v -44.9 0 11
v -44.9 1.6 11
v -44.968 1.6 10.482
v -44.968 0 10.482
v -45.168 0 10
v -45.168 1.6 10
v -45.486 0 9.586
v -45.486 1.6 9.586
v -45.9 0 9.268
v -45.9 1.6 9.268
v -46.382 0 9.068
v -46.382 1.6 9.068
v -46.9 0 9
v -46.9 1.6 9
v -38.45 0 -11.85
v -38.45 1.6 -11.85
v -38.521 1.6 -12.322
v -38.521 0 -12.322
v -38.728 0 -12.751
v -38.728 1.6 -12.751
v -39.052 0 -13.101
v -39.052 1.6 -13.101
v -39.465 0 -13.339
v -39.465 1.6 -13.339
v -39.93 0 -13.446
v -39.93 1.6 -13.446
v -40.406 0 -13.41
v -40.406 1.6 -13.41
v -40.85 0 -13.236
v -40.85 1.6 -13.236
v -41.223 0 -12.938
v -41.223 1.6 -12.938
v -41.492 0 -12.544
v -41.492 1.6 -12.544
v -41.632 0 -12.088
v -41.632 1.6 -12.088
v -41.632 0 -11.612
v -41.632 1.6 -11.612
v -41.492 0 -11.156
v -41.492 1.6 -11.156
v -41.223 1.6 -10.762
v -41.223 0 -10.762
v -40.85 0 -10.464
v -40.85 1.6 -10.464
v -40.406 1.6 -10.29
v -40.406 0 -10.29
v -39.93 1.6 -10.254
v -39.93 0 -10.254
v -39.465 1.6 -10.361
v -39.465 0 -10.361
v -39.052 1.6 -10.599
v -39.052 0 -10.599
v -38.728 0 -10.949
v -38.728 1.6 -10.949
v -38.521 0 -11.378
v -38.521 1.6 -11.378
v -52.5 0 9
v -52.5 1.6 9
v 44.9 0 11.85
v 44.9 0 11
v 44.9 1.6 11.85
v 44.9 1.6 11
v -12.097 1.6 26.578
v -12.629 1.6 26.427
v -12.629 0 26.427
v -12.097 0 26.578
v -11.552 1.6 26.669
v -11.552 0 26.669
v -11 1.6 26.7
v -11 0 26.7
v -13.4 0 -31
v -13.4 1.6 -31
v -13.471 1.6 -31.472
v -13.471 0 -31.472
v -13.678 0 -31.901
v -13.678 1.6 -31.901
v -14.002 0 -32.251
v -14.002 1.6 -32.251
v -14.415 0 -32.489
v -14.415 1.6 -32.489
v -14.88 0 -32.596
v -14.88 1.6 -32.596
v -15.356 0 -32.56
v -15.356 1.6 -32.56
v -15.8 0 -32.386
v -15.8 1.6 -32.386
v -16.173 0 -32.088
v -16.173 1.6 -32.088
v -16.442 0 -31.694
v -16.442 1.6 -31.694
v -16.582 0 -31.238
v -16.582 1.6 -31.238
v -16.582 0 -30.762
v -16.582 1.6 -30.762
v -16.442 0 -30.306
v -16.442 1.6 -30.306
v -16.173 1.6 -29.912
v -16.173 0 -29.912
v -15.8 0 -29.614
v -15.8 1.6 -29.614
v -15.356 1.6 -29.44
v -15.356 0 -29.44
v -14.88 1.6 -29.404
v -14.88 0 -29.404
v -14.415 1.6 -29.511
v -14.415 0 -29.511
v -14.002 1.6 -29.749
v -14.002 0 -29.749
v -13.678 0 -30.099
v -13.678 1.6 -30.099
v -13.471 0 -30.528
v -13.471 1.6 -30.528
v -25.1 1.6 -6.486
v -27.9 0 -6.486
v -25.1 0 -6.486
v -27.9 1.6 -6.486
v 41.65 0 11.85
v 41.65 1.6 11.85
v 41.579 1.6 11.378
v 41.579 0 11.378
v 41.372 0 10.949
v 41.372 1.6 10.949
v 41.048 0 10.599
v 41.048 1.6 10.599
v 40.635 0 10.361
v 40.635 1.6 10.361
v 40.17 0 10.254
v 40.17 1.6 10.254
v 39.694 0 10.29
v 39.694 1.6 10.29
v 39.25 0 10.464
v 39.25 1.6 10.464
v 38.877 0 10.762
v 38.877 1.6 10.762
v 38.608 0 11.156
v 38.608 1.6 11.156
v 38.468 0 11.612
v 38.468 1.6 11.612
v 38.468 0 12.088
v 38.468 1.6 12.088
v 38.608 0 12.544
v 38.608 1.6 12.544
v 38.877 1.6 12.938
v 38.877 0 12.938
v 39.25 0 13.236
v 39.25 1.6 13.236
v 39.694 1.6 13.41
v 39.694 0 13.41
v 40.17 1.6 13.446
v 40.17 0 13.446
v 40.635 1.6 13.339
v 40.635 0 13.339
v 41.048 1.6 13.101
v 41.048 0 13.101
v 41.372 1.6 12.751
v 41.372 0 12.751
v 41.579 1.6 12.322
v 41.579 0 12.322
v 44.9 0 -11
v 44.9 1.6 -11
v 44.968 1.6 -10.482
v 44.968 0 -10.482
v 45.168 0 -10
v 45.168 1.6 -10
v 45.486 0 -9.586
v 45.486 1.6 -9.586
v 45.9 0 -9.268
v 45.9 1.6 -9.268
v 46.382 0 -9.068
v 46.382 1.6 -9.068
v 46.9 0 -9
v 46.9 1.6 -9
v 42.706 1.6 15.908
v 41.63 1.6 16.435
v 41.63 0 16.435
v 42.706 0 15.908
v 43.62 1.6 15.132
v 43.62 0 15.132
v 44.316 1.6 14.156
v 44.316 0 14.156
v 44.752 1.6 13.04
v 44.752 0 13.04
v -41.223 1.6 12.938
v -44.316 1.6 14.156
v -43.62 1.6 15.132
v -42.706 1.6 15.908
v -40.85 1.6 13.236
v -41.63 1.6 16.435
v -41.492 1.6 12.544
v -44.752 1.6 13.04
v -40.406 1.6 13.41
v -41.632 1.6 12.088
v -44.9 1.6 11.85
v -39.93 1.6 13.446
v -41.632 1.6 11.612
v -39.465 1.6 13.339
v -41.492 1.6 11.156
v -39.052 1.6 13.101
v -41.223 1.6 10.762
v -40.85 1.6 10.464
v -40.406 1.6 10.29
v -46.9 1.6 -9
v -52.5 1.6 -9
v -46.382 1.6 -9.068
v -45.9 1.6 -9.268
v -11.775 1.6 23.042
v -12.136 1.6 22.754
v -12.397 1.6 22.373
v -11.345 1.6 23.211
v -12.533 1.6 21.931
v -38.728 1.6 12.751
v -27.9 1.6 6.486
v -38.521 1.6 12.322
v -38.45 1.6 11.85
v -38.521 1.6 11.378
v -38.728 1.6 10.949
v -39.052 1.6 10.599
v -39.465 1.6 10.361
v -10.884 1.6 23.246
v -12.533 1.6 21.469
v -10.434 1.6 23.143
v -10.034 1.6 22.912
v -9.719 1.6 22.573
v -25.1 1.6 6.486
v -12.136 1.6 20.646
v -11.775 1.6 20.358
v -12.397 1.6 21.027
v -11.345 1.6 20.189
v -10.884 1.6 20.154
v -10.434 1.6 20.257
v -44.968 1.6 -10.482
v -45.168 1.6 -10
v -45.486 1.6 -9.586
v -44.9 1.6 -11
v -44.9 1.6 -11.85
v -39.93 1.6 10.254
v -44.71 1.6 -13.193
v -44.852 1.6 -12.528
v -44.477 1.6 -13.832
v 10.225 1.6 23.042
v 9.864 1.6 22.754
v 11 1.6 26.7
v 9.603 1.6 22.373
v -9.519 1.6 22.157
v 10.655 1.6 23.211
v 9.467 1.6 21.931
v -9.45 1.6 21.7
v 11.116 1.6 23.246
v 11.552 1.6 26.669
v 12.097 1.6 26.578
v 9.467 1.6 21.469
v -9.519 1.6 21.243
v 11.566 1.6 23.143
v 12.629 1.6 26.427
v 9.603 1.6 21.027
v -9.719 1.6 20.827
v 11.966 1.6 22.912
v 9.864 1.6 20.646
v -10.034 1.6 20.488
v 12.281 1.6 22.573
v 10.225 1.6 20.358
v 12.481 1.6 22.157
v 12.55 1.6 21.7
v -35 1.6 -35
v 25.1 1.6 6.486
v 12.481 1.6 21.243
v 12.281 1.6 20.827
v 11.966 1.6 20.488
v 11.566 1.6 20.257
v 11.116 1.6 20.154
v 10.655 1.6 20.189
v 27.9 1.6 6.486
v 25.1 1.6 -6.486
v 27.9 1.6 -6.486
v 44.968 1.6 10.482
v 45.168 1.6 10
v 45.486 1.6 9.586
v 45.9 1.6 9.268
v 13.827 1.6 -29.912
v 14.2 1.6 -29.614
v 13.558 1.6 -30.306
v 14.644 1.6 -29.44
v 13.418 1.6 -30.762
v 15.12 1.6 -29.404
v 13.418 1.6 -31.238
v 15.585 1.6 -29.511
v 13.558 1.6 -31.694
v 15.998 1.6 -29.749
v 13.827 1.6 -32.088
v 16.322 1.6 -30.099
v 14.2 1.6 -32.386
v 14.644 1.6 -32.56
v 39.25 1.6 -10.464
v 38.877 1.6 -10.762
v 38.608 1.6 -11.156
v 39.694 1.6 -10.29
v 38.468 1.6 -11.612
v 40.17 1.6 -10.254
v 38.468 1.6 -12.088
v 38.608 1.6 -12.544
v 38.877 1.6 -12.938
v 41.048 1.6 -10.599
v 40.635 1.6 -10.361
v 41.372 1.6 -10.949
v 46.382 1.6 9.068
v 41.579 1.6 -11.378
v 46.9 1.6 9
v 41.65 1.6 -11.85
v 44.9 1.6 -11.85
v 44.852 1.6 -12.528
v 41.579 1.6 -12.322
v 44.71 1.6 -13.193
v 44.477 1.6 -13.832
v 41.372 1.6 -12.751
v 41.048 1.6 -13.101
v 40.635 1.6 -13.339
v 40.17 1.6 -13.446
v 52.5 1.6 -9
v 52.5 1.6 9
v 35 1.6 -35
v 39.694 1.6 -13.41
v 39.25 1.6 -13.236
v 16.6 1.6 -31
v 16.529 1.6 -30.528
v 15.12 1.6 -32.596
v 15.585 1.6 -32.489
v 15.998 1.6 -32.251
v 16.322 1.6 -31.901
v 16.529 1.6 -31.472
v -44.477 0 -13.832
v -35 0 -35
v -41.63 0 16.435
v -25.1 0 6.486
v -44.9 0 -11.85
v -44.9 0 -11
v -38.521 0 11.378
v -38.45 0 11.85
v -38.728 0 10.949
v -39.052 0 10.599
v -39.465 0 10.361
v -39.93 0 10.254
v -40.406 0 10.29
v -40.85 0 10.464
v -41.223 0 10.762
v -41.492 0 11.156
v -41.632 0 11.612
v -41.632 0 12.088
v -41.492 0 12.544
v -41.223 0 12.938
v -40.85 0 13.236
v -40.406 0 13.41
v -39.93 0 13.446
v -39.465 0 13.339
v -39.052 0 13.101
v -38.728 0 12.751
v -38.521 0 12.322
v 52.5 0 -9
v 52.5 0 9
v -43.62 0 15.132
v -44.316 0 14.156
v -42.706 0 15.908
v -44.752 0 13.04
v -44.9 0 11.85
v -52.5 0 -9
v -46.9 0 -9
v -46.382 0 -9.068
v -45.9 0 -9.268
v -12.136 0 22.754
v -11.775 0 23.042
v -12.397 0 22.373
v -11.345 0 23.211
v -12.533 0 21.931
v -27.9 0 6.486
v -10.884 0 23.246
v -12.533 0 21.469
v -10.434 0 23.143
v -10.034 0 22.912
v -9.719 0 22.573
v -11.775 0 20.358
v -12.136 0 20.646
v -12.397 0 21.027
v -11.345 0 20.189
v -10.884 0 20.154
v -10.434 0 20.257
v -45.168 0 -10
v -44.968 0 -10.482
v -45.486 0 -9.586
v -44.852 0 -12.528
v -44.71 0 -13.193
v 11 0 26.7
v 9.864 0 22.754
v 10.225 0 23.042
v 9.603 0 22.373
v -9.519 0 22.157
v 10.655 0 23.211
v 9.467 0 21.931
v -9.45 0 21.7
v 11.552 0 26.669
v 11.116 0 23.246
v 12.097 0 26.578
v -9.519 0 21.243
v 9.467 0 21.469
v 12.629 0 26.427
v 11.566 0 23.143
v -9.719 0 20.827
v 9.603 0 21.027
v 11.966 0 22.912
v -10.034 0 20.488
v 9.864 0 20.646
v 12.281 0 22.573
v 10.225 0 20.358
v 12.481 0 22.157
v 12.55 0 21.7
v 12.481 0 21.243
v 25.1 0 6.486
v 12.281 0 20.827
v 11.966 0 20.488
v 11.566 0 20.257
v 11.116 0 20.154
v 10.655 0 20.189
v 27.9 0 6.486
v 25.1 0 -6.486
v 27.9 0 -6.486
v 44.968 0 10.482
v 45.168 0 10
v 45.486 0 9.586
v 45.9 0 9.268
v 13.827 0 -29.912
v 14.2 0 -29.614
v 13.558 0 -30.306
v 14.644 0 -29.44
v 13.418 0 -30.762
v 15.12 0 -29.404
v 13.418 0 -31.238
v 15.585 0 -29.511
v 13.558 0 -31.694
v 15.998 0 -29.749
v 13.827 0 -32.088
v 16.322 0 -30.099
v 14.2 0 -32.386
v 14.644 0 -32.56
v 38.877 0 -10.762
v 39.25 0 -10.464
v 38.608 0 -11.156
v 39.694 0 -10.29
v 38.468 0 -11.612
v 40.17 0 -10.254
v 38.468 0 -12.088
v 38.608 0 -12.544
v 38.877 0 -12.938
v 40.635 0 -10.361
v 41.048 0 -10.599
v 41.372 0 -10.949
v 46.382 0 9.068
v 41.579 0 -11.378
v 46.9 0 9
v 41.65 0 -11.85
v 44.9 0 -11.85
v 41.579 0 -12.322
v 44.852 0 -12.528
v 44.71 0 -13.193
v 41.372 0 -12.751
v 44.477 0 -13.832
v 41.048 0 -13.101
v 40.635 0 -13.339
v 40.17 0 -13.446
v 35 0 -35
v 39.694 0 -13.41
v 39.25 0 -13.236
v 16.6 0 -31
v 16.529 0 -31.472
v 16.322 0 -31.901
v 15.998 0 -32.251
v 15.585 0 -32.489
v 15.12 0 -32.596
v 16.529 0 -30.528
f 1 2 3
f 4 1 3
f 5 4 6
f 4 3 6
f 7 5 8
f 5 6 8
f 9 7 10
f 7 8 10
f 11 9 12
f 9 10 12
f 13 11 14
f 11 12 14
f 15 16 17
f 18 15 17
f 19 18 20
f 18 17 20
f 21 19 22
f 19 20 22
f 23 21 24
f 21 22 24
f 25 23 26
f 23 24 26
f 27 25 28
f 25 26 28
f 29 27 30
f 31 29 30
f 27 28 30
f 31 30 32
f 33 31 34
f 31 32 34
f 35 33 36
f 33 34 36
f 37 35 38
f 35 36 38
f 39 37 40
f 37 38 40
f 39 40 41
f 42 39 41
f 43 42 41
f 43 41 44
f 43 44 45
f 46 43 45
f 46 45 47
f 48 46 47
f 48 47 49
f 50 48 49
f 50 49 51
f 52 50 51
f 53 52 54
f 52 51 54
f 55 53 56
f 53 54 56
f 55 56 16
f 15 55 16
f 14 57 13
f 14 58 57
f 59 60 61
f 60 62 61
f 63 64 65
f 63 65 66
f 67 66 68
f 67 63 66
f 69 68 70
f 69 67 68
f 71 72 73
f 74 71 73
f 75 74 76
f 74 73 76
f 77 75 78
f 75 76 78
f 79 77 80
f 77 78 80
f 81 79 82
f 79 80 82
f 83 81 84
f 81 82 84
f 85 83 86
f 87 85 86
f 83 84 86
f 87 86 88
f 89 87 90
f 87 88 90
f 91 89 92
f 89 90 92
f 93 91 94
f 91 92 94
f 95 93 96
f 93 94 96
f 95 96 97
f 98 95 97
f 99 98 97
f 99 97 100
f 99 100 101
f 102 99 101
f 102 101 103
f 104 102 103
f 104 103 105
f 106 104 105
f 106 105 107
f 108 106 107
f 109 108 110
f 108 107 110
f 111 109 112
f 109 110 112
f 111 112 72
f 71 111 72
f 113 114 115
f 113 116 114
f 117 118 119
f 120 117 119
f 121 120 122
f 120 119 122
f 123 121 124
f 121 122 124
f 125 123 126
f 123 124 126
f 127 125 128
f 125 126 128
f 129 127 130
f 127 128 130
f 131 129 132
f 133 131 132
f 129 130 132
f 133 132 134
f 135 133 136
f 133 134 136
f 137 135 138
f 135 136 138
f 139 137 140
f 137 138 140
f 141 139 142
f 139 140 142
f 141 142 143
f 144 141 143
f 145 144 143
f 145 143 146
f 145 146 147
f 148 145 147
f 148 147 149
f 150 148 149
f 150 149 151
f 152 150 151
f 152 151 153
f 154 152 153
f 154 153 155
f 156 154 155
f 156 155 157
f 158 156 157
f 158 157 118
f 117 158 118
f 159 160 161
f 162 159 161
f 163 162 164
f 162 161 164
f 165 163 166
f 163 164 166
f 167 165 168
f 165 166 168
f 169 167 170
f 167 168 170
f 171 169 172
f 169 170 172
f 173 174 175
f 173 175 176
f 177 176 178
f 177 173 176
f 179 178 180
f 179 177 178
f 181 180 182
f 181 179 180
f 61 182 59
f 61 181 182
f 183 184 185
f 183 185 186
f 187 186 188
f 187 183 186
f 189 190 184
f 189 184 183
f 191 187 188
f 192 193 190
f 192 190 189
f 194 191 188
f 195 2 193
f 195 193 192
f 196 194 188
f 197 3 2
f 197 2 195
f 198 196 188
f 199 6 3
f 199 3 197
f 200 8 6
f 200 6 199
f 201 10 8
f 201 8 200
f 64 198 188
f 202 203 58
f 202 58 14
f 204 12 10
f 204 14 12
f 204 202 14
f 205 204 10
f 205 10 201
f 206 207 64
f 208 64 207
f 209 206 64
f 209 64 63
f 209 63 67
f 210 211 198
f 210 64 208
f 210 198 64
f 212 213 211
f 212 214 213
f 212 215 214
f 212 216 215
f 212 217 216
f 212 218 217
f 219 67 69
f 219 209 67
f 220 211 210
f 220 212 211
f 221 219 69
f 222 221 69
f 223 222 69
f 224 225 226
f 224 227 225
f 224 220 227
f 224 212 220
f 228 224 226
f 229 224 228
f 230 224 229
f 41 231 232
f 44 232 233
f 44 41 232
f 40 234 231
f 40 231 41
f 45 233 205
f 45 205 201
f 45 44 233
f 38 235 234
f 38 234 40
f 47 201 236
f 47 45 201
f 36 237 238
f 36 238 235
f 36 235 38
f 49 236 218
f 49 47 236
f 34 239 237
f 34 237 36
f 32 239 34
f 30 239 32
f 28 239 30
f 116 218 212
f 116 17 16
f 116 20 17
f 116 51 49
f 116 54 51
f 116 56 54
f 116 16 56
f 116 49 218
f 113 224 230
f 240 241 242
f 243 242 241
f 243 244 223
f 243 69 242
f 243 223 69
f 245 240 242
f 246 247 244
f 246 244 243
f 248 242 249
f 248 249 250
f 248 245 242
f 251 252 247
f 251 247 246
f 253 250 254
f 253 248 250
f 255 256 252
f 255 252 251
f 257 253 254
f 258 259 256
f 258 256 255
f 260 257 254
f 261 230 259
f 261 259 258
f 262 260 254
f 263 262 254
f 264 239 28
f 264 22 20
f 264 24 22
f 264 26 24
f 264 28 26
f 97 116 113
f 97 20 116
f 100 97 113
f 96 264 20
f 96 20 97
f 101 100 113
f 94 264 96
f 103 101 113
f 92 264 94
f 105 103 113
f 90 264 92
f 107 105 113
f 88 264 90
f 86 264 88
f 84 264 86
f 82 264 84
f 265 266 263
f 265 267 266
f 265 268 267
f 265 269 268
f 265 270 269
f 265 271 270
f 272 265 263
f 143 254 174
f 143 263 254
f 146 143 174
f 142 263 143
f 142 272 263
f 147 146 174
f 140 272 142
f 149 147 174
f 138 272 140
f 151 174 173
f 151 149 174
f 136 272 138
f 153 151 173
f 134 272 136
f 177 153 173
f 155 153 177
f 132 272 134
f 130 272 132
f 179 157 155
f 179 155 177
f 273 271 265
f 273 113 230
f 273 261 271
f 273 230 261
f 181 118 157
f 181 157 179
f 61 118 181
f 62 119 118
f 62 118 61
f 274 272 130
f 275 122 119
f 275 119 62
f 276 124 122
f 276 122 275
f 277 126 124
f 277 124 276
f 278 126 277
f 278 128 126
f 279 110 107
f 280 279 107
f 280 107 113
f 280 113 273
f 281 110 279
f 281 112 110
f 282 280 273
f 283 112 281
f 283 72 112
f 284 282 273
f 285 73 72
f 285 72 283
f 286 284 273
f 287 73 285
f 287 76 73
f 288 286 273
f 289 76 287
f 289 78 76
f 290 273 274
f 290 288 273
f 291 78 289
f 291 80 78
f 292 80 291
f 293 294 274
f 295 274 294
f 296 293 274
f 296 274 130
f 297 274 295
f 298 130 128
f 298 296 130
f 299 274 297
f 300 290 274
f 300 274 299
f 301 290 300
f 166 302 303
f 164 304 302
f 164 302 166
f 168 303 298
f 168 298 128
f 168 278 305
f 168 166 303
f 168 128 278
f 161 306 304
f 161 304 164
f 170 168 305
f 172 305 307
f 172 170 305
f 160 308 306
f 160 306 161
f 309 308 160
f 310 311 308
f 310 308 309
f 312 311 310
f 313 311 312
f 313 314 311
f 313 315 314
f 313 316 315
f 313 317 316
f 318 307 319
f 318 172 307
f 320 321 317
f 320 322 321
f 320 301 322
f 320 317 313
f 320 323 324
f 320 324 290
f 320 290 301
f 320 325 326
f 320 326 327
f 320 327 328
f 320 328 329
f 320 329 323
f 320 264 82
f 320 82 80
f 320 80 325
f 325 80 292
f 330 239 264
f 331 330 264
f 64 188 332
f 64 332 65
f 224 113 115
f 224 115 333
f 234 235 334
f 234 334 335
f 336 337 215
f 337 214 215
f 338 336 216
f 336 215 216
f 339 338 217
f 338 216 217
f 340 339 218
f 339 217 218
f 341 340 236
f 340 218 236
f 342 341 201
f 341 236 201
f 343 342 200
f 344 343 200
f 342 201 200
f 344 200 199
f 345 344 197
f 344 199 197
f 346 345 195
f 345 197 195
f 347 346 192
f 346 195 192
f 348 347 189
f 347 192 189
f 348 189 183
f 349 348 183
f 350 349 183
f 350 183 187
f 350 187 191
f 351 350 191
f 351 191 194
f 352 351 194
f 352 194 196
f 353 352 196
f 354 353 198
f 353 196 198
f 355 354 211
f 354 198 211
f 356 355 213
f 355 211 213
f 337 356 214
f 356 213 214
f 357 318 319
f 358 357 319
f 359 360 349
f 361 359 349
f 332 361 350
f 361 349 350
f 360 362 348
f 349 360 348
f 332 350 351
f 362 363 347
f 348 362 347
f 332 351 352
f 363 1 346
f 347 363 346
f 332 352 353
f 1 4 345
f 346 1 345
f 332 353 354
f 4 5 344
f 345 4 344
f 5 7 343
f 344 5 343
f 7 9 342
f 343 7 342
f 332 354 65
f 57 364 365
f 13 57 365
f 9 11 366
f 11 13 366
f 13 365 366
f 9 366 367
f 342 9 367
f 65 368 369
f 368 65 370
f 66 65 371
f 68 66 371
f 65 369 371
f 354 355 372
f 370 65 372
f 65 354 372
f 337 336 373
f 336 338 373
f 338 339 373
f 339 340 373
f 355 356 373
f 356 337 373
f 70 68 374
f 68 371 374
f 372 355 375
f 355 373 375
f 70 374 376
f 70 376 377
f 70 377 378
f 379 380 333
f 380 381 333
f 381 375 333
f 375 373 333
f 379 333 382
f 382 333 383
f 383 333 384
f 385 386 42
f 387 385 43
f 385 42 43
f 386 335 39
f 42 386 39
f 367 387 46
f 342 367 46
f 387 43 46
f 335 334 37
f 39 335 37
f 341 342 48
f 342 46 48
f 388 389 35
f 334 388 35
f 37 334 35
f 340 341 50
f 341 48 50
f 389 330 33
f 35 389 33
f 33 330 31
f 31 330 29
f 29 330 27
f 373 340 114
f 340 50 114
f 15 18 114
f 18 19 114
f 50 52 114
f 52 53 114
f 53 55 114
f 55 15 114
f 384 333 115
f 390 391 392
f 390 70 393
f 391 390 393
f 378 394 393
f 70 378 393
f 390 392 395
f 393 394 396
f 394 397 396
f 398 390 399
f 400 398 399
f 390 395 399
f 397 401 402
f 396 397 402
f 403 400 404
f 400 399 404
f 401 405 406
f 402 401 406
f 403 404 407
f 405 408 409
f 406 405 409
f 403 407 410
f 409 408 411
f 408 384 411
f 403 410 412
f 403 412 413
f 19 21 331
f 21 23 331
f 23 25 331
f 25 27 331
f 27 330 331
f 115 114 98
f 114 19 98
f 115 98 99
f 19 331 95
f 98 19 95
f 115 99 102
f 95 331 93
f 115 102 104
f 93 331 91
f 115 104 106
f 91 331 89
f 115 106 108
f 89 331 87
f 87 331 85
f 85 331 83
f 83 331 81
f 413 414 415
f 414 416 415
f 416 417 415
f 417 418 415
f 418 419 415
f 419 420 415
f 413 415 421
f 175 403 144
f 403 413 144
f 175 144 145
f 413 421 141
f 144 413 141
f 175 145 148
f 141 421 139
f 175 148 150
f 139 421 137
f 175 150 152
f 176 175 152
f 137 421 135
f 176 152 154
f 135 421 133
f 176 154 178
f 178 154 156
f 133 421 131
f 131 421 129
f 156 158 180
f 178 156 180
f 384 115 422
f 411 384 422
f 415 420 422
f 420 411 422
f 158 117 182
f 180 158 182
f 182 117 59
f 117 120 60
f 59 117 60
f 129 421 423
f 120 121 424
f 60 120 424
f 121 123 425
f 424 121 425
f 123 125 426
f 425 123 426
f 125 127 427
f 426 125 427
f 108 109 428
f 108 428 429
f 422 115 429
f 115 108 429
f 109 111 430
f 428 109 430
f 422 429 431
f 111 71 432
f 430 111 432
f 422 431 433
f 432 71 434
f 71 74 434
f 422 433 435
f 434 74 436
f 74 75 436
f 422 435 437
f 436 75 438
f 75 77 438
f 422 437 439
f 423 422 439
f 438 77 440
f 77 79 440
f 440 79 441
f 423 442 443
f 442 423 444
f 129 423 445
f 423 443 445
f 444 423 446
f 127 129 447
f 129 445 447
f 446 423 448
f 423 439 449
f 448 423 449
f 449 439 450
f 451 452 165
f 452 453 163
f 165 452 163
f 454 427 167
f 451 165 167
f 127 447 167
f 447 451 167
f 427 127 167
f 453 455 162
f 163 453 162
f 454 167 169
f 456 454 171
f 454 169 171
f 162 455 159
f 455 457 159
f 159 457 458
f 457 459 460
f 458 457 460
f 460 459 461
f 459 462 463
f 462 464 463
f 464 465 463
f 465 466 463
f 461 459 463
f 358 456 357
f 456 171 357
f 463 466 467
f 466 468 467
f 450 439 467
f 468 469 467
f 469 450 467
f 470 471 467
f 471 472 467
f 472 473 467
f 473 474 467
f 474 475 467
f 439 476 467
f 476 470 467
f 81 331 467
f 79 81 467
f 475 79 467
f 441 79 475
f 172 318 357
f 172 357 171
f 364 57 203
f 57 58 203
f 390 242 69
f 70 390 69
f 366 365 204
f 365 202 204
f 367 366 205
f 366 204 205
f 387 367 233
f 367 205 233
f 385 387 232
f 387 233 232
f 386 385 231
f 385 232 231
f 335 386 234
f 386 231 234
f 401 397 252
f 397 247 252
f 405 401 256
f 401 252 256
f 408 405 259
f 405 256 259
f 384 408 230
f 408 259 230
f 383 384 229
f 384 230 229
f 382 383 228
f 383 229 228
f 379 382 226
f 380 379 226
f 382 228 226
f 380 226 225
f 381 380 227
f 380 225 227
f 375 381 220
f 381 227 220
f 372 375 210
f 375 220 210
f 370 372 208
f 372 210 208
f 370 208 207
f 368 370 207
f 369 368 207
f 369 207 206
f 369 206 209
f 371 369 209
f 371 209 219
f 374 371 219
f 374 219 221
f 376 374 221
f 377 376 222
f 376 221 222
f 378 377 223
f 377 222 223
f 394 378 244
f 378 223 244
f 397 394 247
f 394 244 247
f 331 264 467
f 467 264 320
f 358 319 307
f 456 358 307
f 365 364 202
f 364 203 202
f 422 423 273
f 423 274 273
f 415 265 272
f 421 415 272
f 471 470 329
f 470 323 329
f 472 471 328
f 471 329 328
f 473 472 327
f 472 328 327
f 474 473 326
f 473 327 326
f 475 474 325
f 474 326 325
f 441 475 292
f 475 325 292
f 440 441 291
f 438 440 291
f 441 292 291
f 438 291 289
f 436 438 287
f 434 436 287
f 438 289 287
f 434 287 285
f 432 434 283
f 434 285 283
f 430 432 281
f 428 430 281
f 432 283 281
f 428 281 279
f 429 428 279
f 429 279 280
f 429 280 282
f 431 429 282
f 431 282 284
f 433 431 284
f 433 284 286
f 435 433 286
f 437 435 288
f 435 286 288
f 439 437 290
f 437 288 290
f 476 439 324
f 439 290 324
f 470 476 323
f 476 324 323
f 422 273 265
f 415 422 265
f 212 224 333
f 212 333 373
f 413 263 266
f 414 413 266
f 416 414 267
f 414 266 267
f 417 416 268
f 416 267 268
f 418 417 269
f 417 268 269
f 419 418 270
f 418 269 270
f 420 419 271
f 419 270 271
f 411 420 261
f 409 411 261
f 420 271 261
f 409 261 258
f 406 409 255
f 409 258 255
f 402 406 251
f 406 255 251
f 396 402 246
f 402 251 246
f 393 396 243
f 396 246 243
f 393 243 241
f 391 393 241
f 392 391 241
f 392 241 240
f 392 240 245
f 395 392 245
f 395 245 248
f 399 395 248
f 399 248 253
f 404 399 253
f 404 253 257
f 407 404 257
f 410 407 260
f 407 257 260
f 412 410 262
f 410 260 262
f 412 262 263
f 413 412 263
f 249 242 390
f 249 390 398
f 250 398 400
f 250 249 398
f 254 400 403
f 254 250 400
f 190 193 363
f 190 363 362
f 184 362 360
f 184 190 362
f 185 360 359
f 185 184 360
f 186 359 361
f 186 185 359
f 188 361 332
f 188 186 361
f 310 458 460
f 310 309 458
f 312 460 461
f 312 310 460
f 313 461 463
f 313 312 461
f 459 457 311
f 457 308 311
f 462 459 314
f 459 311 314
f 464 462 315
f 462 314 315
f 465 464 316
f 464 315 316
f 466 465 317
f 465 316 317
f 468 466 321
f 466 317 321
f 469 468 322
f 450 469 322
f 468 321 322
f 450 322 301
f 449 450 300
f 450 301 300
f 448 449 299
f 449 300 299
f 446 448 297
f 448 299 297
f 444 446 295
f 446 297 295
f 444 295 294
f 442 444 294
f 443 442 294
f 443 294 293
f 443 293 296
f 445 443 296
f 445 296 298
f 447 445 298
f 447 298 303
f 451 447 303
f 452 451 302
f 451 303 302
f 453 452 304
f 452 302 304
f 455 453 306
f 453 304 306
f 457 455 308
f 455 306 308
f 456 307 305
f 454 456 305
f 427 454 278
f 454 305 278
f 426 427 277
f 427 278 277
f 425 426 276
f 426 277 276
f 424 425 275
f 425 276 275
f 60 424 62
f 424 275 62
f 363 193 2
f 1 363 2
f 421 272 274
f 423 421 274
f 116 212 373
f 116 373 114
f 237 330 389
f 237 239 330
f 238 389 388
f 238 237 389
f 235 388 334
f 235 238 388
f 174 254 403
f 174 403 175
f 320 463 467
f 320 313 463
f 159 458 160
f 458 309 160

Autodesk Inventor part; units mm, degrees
ref_plane "YZ Plane" through (0, 0, 0) normal (1, 0, 0) x (0, 1, 0)
ref_plane "XZ Plane" through (0, 0, 0) normal (0, 1, 0) x (-1, 0, 0)
ref_plane "XY Plane" through (0, 0, 0) normal (0, 0, 1) x (1, 0, 0)
sketch "Szkic1" plane through (0, 0, 0) normal (0, 1, 0) x (-1, 0, 0)
  line L0 (52.5, 25) -> (-52.5, 25)
  line L1 (-52.5, 25) -> (-52.5, -25)
  line L2 (-52.5, -25) -> (52.5, -25)
  line L3 (52.5, -25) -> (52.5, 25)
  line L4 (52.5, 25) -> (-52.5, -25) construction
  line L5 (-52.5, 25) -> (52.5, -25) construction
  point P0 (0, 0)
  dimension "d0" = 105
  dimension "d1" = 50
extrude "Wyciągnięcie proste1" add sketch "Szkic1" along normal blind 1.6
sketch "Szkic5" plane through (0, 1.6, 0) normal (0, 1, 0) x (1, 0, 0)
  circle A0 centre (-40.05, 11.85) radius 1.6 projected
  circle A1 centre (-40.05, -11.85) radius 1.6 projected
  circle A2 centre (40.05, 11.85) radius 1.6 projected
  circle A3 centre (40.05, -11.85) radius 1.6 projected
  point P0 (0, 0)
extrude "Wyciągnięcie proste4" cut sketch "Szkic5" against normal blind 10
sketch "Szkic6" plane through (0, 1.6, 0) normal (0, 1, 0) x (1, 0, 0)
  line L0 (52.5, 25) -> (-52.5, 25) projected
  line L1 (52.5, 25) -> (-52.5, 25)
  line L2 (-52.5, 25) -> (-52.5, 35)
  line L3 (-52.5, 35) -> (52.5, 35)
  line L4 (52.5, 35) -> (52.5, 25)
  point P0 (0, 0)
  point P1 (-52.5, 25)
  dimension "d15" = 10
extrude "Wyciągnięcie proste5" add sketch "Szkic6" against normal up to surface (1.6 mm away)
sketch "Szkic7" plane through (0, 1.6, 0) normal (0, 1, 0) x (1, 0, 0)
  arc A0 (35.2, -11.85) -> (44.9, -11.85) centre (40.05, -11.85) ccw projected
  arc A1 (46.9, -9) -> (44.9, -11) centre (46.9, -11) ccw projected
  line L0 (44.9, -11) -> (44.9, -11.85) projected
  line L1 (52.5, -9) -> (35.2, -9) projected
  line L2 (52.5, 9) -> (35.2, 9) projected
  arc A2 (44.9, 11) -> (46.9, 9) centre (46.9, 11) ccw projected
  arc A3 (44.9, 11.85) -> (35.2, 11.85) centre (40.05, 11.85) ccw projected
  line L3 (-52.5, -9) -> (-35.2, -9) projected
  arc A4 (-44.9, -11) -> (-46.9, -9) centre (-46.9, -11) ccw projected
  arc A5 (-44.9, -11.85) -> (-35.2, -11.85) centre (-40.05, -11.85) ccw projected
  line L4 (-52.5, 9) -> (-35.2, 9) projected
  arc A6 (-46.9, 9) -> (-44.9, 11) centre (-46.9, 11) ccw projected
  arc A7 (-35.2, 11.85) -> (-44.9, 11.85) centre (-40.05, 11.85) ccw projected
  line L5 (40.05, -16.7) -> (-40.05, -16.7)
  line L6 (52.5, 35) -> (-52.5, 35) projected
  circle A8 centre (11, -83.1715) radius 1.55 projected
  circle A9 centre (-11, -83.1715) radius 1.55 projected
  circle A10 centre (-11, -21.7) radius 1.55
  circle A11 centre (11, -21.7) radius 1.55
  circle A12 centre (-11, -21.7) radius 5
  circle A13 centre (11, -21.7) radius 5
  line L7 (16, -21.7) -> (16, -16.7)
  line L8 (-16, -21.7) -> (-16, -16.7)
  line L9 (11, -26.7) -> (-11, -26.7)
  circle A14 centre (40.05, 11.85) radius 1.6 projected
  circle A15 centre (-40.05, 11.85) radius 1.6 projected
  circle A16 centre (40.05, -11.85) radius 1.6 projected
  circle A17 centre (-40.05, -11.85) radius 1.6 projected
  line L10 (52.5, -25) -> (52.5, 35) projected
  line L11 (52.5, 35) -> (-52.5, 35) projected
  line L12 (-52.5, 35) -> (-52.5, -25) projected
  line L13 (-52.5, -25) -> (52.5, -25) projected
  arc A18 (-44.9, -11.85) -> (-35.2, -11.85) centre (-40.05, -11.85) ccw projected
  arc A19 (-44.9, -11.85) -> (-35.2, -11.85) centre (-40.05, -11.85) ccw projected
  line L14 (-44.9, -11.85) -> (-44.9, -11) projected
  point P0 (0, 0)
  point P1 (14.7563, -25)
  point P2 (-14.7563, -25)
  dimension "d18" = 3.1
  dimension "d19" = 3.1
  dimension "d20" = 10
  dimension "d21" = 10
extrude "Wyciągnięcie proste6" cut sketch "Szkic7" against normal blind 10 contours A0 L0 A1 L1 L10 L13 A13 L7 L5 | L8 A12 L13 L12 L3 A4 L14 A5 L5 | A10 | A11
sketch "Szkic8" plane through (0, 1.6, 0) normal (0, 1, 0) x (1, 0, 0)
  circle A0 centre (11, -21.7) radius 1.55 projected
  circle A1 centre (-11, -21.7) radius 1.55 projected
  arc A2 (14.7563, -25) -> (16, -21.7) centre (11, -21.7) ccw projected
  circle A3 centre (11, -21.7) radius 5
  line L0 (-14.7563, -25) -> (14.7563, -25) projected
  circle A4 centre (-11, -21.7) radius 5
  line L1 (11, -26.7) -> (-11, -26.7)
  point P0 (0, 0)
extrude "Wyciągnięcie proste7" add sketch "Szkic8" against normal up to surface (1.6 mm away) contours A3 L0 | L1 A4 L0 A3 | A4 L0 picked at (-10.008, -25.2393)
sketch "Szkic9" plane through (0, 1.6, 0) normal (0, 1, 0) x (1, 0, 0)
  circle A0 centre (11, 10.1285) radius 1.5 projected
  circle A1 centre (-11, 10.1285) radius 1.5 projected
  circle A2 centre (-15, 31) radius 1.6
  circle A3 centre (15, 31) radius 1.6
  line L0 (15, 31) -> (-15, 31)
  line L1 (52.5, 35) -> (-52.5, 35) projected
  point P0 (0, 0)
  point P1 (0, 35)
  point P2 (0, 31)
  dimension "d26" = 3.2
  dimension "d27" = 3.2
  dimension "d28" = 30
  dimension "d29" = 4
extrude "Wyciągnięcie proste8" cut sketch "Szkic9" against normal through all contours A2 | A3
sketch "Szkic10" plane through (0, 1.6, 0) normal (0, 1, 0) x (1, 0, 0)
  line L0 (-27.4, 5.9859) -> (-27.4, -5.9859) projected
  line L1 (-25.6, 5.9859) -> (-27.4, 5.9859) projected
  line L2 (-25.6, -5.9859) -> (-25.6, 5.9859) projected
  line L3 (-27.4, -5.9859) -> (-25.6, -5.9859) projected
  line L4 (27.4, -5.9859) -> (27.4, 5.9859) projected
  line L5 (25.6, -5.9859) -> (27.4, -5.9859) projected
  line L6 (25.6, 5.9859) -> (25.6, -5.9859) projected
  line L7 (27.4, 5.9859) -> (25.6, 5.9859) projected
  line L8 (-27.9, -6.4859) -> (-27.9, 6.4859)
  line L9 (-27.9, 6.4859) -> (-25.1, 6.4859)
  line L10 (-25.1, 6.4859) -> (-25.1, -6.4859)
  line L11 (-25.1, -6.4859) -> (-27.9, -6.4859)
  line L12 (25.1, -6.4859) -> (27.9, -6.4859)
  line L13 (27.9, -6.4859) -> (27.9, 6.4859)
  line L14 (27.9, 6.4859) -> (25.1, 6.4859)
  line L15 (25.1, 6.4859) -> (25.1, -6.4859)
  point P0 (0, 0)
  dimension "d32" = 0.5
  dimension "d33" = 0.5
extrude "Wyciągnięcie proste9" cut sketch "Szkic10" against normal blind 10 contours L1 L2 L3 L0 | L5 L6 L7 L4 | L8 L9 L10 L11 | L15 L14 L13 L12
sketch "Szkic11" plane through (0, 1.6, 0) normal (0, 1, 0) x (1, 0, 0)
  circle A0 centre (40.05, 11.85) radius 1.6 projected
  line L0 (52.5, 9) -> (46.9, 9) projected
  line L1 (52.5, 9) -> (52.5, 6) projected
  line L2 (52.5, 6) -> (35.2, 6) projected
  line L3 (35.2, 11.85) -> (35.2, 6) projected
  arc A1 (44.9, 11.85) -> (35.2, 11.85) centre (40.05, 11.85) ccw projected
  line L4 (44.9, 11.85) -> (44.9, 11) projected
  arc A2 (44.9, 11) -> (46.9, 9) centre (46.9, 11) ccw projected
  circle A3 centre (-40.05, 11.85) radius 1.6 projected
  line L5 (-35.2, 6) -> (-35.2, 11.85) projected
  line L6 (-52.5, 6) -> (-35.2, 6) projected
  line L7 (-52.5, 9) -> (-52.5, 6) projected
  line L8 (-52.5, 9) -> (-46.9, 9) projected
  arc A4 (-46.9, 9) -> (-44.9, 11) centre (-46.9, 11) ccw projected
  line L9 (-44.9, 11.85) -> (-44.9, 11) projected
  arc A5 (-35.2, 11.85) -> (-44.9, 11.85) centre (-40.05, 11.85) ccw projected
  line L10 (44.4767, 13.8317) -> (35, 35)
  line L11 (-52.5, 35) -> (52.5, 35) projected
  circle A6 centre (15, 31) radius 1.6 projected
  line L12 (-45.0282, 12.5998) -> (-35, 35)
  circle A7 centre (-15, 31) radius 1.6 projected
  line L13 (-27.9, 6.4859) -> (-25.1, 6.4859) projected
  line L14 (-25.1, 6.4859) -> (-25.1, -6.4859) projected
  line L15 (-25.1, -6.4859) -> (-27.9, -6.4859) projected
  line L16 (-27.9, -6.4859) -> (-27.9, 6.4859) projected
  line L17 (25.1, 6.4859) -> (27.9, 6.4859) projected
  line L18 (27.9, 6.4859) -> (27.9, -6.4859) projected
  line L19 (27.9, -6.4859) -> (25.1, -6.4859) projected
  line L20 (25.1, -6.4859) -> (25.1, 6.4859) projected
  circle A8 centre (15, 31) radius 1.6 projected
  circle A9 centre (-15, 31) radius 1.6 projected
  line L21 (46.9, -9) -> (52.5, -9) projected
  line L22 (52.5, -9) -> (52.5, 35) projected
  line L23 (52.5, 35) -> (-52.5, 35) projected
  line L24 (-52.5, 35) -> (-52.5, -9) projected
  line L25 (-52.5, -9) -> (-46.9, -9) projected
  arc A10 (-44.9, -11) -> (-46.9, -9) centre (-46.9, -11) ccw projected
  line L26 (-44.9, -11) -> (-44.9, -11.85) projected
  arc A11 (-44.9, -11.85) -> (-40.05, -16.7) centre (-40.05, -11.85) ccw projected
  line L27 (-40.05, -16.7) -> (-16, -16.7) projected
  line L28 (-16, -16.7) -> (-16, -21.7) projected
  arc A12 (-16, -21.7) -> (-11, -26.7) centre (-11, -21.7) ccw projected
  line L29 (-11, -26.7) -> (11, -26.7) projected
  arc A13 (11, -26.7) -> (16, -21.7) centre (11, -21.7) ccw projected
  line L30 (16, -21.7) -> (16, -16.7) projected
  line L31 (16, -16.7) -> (40.05, -16.7) projected
  arc A14 (40.05, -16.7) -> (44.9, -11.85) centre (40.05, -11.85) ccw projected
  line L32 (44.9, -11.85) -> (44.9, -11) projected
  arc A15 (46.9, -9) -> (44.9, -11) centre (46.9, -11) ccw projected
  circle A16 centre (11, -21.7) radius 1.55 projected
  circle A17 centre (-11, -21.7) radius 1.55 projected
  circle A18 centre (40.05, 11.85) radius 1.6 projected
  circle A19 centre (-40.05, 11.85) radius 1.6 projected
  circle A20 centre (40.05, -11.85) radius 1.6 projected
  circle A21 centre (-40.05, -11.85) radius 1.6 projected
  point P0 (0, 0)
  point P1 (-44.4767, 13.8317)
  point P2 (52.5, 35)
  dimension "d36" = 20
  dimension "d37" = 20
extrude "Wyciągnięcie proste10" cut sketch "Szkic11" against normal blind 10 contours L0 A2 L4 A1 L10 L11 L22 | L12 A5 L9 A4 L8 L24 L11
sketch "Szkic13" plane through (0, 1.6, 0) normal (0, 1, 0) x (1, 0, 0)
  arc A0 (-44.9, -11.85) -> (-40.05, -16.7) centre (-40.05, -11.85) ccw projected
  arc A1 (-16, -21.7) -> (-11, -26.7) centre (-11, -21.7) ccw projected
  arc A2 (11, -26.7) -> (16, -21.7) centre (11, -21.7) ccw projected
  arc A3 (40.05, -16.7) -> (44.9, -11.85) centre (40.05, -11.85) ccw projected
  line L0 (-50.1769, -13.4907) -> (-7.453, -28.2105)
  line L1 (7.6845, -28.1307) -> (52.6221, -12.6483)
  line L2 (-40.05, -16.7) -> (-16, -16.7) projected
  line L3 (-16, -16.7) -> (-16, -21.7) projected
  line L4 (16, -21.7) -> (16, -16.7) projected
  line L5 (16, -16.7) -> (40.05, -16.7) projected
  point P0 (0, 0)
  point P1 (12.6287, -26.4273)
  point P2 (41.6298, -16.4355)
  point P3 (-41.6298, -16.4355)
  point P4 (-12.6287, -26.4273)
extrude "Wyciągnięcie proste11" add sketch "Szkic13" against normal up to surface (1.6 mm away)
sketch "Szkic14" plane through (0, 1.6, 0) normal (0, 1, 0) x (1, 0, 0)
  circle A0 centre (-40.05, -11.85) radius 1.6 projected
  circle A1 centre (40.05, -11.85) radius 1.6 projected
  circle A2 centre (-40.05, 11.85) radius 1.6 projected
  circle A3 centre (40.05, 11.85) radius 1.6 projected
  circle A4 centre (-11, -21.7) radius 1.55 projected
  circle A5 centre (11, -21.7) radius 1.55 projected
  circle A6 centre (-15, 31) radius 1.6 projected
  circle A7 centre (15, 31) radius 1.6 projected
  line L0 (25.1, 6.4859) -> (27.9, 6.4859) projected
  line L1 (27.9, 6.4859) -> (27.9, -6.4859) projected
  line L2 (27.9, -6.4859) -> (25.1, -6.4859) projected
  line L3 (25.1, -6.4859) -> (25.1, 6.4859) projected
  line L4 (-27.9, 6.4859) -> (-25.1, 6.4859) projected
  line L5 (-25.1, 6.4859) -> (-25.1, -6.4859) projected
  line L6 (-25.1, -6.4859) -> (-27.9, -6.4859) projected
  line L7 (-27.9, -6.4859) -> (-27.9, 6.4859) projected
  line L8 (-35, 35) -> (-44.4767, 13.8317) projected
  arc A8 (-44.4767, 13.8317) -> (-44.9, 11.85) centre (-40.05, 11.85) ccw projected
  line L9 (-44.9, 11.85) -> (-44.9, 11) projected
  arc A9 (-46.9, 9) -> (-44.9, 11) centre (-46.9, 11) ccw projected
  line L10 (-46.9, 9) -> (-52.5, 9) projected
  line L11 (-52.5, 9) -> (-52.5, -9) projected
  line L12 (-52.5, -9) -> (-46.9, -9) projected
  arc A10 (-44.9, -11) -> (-46.9, -9) centre (-46.9, -11) ccw projected
  line L13 (-44.9, -11) -> (-44.9, -11.85) projected
  arc A11 (-44.9, -11.85) -> (-41.6298, -16.4355) centre (-40.05, -11.85) ccw projected
  line L14 (-41.6298, -16.4355) -> (-12.6287, -26.4273) projected
  arc A12 (-12.6287, -26.4273) -> (-11, -26.7) centre (-11, -21.7) ccw projected
  line L15 (-11, -26.7) -> (11, -26.7) projected
  arc A13 (11, -26.7) -> (12.6287, -26.4273) centre (11, -21.7) ccw projected
  line L16 (12.6287, -26.4273) -> (41.6298, -16.4355) projected
  arc A14 (41.6298, -16.4355) -> (44.9, -11.85) centre (40.05, -11.85) ccw projected
  line L17 (44.9, -11.85) -> (44.9, -11) projected
  arc A15 (46.9, -9) -> (44.9, -11) centre (46.9, -11) ccw projected
  line L18 (46.9, -9) -> (52.5, -9) projected
  line L19 (52.5, -9) -> (52.5, 9) projected
  line L20 (52.5, 9) -> (46.9, 9) projected
  arc A16 (44.9, 11) -> (46.9, 9) centre (46.9, 11) ccw projected
  line L21 (44.9, 11) -> (44.9, 11.85) projected
  arc A17 (44.9, 11.85) -> (44.4767, 13.8317) centre (40.05, 11.85) ccw projected
  line L22 (44.4767, 13.8317) -> (35, 35) projected
  line L23 (35, 35) -> (-35, 35) projected
  point P0 (0, 0)
properties part number "ty"
